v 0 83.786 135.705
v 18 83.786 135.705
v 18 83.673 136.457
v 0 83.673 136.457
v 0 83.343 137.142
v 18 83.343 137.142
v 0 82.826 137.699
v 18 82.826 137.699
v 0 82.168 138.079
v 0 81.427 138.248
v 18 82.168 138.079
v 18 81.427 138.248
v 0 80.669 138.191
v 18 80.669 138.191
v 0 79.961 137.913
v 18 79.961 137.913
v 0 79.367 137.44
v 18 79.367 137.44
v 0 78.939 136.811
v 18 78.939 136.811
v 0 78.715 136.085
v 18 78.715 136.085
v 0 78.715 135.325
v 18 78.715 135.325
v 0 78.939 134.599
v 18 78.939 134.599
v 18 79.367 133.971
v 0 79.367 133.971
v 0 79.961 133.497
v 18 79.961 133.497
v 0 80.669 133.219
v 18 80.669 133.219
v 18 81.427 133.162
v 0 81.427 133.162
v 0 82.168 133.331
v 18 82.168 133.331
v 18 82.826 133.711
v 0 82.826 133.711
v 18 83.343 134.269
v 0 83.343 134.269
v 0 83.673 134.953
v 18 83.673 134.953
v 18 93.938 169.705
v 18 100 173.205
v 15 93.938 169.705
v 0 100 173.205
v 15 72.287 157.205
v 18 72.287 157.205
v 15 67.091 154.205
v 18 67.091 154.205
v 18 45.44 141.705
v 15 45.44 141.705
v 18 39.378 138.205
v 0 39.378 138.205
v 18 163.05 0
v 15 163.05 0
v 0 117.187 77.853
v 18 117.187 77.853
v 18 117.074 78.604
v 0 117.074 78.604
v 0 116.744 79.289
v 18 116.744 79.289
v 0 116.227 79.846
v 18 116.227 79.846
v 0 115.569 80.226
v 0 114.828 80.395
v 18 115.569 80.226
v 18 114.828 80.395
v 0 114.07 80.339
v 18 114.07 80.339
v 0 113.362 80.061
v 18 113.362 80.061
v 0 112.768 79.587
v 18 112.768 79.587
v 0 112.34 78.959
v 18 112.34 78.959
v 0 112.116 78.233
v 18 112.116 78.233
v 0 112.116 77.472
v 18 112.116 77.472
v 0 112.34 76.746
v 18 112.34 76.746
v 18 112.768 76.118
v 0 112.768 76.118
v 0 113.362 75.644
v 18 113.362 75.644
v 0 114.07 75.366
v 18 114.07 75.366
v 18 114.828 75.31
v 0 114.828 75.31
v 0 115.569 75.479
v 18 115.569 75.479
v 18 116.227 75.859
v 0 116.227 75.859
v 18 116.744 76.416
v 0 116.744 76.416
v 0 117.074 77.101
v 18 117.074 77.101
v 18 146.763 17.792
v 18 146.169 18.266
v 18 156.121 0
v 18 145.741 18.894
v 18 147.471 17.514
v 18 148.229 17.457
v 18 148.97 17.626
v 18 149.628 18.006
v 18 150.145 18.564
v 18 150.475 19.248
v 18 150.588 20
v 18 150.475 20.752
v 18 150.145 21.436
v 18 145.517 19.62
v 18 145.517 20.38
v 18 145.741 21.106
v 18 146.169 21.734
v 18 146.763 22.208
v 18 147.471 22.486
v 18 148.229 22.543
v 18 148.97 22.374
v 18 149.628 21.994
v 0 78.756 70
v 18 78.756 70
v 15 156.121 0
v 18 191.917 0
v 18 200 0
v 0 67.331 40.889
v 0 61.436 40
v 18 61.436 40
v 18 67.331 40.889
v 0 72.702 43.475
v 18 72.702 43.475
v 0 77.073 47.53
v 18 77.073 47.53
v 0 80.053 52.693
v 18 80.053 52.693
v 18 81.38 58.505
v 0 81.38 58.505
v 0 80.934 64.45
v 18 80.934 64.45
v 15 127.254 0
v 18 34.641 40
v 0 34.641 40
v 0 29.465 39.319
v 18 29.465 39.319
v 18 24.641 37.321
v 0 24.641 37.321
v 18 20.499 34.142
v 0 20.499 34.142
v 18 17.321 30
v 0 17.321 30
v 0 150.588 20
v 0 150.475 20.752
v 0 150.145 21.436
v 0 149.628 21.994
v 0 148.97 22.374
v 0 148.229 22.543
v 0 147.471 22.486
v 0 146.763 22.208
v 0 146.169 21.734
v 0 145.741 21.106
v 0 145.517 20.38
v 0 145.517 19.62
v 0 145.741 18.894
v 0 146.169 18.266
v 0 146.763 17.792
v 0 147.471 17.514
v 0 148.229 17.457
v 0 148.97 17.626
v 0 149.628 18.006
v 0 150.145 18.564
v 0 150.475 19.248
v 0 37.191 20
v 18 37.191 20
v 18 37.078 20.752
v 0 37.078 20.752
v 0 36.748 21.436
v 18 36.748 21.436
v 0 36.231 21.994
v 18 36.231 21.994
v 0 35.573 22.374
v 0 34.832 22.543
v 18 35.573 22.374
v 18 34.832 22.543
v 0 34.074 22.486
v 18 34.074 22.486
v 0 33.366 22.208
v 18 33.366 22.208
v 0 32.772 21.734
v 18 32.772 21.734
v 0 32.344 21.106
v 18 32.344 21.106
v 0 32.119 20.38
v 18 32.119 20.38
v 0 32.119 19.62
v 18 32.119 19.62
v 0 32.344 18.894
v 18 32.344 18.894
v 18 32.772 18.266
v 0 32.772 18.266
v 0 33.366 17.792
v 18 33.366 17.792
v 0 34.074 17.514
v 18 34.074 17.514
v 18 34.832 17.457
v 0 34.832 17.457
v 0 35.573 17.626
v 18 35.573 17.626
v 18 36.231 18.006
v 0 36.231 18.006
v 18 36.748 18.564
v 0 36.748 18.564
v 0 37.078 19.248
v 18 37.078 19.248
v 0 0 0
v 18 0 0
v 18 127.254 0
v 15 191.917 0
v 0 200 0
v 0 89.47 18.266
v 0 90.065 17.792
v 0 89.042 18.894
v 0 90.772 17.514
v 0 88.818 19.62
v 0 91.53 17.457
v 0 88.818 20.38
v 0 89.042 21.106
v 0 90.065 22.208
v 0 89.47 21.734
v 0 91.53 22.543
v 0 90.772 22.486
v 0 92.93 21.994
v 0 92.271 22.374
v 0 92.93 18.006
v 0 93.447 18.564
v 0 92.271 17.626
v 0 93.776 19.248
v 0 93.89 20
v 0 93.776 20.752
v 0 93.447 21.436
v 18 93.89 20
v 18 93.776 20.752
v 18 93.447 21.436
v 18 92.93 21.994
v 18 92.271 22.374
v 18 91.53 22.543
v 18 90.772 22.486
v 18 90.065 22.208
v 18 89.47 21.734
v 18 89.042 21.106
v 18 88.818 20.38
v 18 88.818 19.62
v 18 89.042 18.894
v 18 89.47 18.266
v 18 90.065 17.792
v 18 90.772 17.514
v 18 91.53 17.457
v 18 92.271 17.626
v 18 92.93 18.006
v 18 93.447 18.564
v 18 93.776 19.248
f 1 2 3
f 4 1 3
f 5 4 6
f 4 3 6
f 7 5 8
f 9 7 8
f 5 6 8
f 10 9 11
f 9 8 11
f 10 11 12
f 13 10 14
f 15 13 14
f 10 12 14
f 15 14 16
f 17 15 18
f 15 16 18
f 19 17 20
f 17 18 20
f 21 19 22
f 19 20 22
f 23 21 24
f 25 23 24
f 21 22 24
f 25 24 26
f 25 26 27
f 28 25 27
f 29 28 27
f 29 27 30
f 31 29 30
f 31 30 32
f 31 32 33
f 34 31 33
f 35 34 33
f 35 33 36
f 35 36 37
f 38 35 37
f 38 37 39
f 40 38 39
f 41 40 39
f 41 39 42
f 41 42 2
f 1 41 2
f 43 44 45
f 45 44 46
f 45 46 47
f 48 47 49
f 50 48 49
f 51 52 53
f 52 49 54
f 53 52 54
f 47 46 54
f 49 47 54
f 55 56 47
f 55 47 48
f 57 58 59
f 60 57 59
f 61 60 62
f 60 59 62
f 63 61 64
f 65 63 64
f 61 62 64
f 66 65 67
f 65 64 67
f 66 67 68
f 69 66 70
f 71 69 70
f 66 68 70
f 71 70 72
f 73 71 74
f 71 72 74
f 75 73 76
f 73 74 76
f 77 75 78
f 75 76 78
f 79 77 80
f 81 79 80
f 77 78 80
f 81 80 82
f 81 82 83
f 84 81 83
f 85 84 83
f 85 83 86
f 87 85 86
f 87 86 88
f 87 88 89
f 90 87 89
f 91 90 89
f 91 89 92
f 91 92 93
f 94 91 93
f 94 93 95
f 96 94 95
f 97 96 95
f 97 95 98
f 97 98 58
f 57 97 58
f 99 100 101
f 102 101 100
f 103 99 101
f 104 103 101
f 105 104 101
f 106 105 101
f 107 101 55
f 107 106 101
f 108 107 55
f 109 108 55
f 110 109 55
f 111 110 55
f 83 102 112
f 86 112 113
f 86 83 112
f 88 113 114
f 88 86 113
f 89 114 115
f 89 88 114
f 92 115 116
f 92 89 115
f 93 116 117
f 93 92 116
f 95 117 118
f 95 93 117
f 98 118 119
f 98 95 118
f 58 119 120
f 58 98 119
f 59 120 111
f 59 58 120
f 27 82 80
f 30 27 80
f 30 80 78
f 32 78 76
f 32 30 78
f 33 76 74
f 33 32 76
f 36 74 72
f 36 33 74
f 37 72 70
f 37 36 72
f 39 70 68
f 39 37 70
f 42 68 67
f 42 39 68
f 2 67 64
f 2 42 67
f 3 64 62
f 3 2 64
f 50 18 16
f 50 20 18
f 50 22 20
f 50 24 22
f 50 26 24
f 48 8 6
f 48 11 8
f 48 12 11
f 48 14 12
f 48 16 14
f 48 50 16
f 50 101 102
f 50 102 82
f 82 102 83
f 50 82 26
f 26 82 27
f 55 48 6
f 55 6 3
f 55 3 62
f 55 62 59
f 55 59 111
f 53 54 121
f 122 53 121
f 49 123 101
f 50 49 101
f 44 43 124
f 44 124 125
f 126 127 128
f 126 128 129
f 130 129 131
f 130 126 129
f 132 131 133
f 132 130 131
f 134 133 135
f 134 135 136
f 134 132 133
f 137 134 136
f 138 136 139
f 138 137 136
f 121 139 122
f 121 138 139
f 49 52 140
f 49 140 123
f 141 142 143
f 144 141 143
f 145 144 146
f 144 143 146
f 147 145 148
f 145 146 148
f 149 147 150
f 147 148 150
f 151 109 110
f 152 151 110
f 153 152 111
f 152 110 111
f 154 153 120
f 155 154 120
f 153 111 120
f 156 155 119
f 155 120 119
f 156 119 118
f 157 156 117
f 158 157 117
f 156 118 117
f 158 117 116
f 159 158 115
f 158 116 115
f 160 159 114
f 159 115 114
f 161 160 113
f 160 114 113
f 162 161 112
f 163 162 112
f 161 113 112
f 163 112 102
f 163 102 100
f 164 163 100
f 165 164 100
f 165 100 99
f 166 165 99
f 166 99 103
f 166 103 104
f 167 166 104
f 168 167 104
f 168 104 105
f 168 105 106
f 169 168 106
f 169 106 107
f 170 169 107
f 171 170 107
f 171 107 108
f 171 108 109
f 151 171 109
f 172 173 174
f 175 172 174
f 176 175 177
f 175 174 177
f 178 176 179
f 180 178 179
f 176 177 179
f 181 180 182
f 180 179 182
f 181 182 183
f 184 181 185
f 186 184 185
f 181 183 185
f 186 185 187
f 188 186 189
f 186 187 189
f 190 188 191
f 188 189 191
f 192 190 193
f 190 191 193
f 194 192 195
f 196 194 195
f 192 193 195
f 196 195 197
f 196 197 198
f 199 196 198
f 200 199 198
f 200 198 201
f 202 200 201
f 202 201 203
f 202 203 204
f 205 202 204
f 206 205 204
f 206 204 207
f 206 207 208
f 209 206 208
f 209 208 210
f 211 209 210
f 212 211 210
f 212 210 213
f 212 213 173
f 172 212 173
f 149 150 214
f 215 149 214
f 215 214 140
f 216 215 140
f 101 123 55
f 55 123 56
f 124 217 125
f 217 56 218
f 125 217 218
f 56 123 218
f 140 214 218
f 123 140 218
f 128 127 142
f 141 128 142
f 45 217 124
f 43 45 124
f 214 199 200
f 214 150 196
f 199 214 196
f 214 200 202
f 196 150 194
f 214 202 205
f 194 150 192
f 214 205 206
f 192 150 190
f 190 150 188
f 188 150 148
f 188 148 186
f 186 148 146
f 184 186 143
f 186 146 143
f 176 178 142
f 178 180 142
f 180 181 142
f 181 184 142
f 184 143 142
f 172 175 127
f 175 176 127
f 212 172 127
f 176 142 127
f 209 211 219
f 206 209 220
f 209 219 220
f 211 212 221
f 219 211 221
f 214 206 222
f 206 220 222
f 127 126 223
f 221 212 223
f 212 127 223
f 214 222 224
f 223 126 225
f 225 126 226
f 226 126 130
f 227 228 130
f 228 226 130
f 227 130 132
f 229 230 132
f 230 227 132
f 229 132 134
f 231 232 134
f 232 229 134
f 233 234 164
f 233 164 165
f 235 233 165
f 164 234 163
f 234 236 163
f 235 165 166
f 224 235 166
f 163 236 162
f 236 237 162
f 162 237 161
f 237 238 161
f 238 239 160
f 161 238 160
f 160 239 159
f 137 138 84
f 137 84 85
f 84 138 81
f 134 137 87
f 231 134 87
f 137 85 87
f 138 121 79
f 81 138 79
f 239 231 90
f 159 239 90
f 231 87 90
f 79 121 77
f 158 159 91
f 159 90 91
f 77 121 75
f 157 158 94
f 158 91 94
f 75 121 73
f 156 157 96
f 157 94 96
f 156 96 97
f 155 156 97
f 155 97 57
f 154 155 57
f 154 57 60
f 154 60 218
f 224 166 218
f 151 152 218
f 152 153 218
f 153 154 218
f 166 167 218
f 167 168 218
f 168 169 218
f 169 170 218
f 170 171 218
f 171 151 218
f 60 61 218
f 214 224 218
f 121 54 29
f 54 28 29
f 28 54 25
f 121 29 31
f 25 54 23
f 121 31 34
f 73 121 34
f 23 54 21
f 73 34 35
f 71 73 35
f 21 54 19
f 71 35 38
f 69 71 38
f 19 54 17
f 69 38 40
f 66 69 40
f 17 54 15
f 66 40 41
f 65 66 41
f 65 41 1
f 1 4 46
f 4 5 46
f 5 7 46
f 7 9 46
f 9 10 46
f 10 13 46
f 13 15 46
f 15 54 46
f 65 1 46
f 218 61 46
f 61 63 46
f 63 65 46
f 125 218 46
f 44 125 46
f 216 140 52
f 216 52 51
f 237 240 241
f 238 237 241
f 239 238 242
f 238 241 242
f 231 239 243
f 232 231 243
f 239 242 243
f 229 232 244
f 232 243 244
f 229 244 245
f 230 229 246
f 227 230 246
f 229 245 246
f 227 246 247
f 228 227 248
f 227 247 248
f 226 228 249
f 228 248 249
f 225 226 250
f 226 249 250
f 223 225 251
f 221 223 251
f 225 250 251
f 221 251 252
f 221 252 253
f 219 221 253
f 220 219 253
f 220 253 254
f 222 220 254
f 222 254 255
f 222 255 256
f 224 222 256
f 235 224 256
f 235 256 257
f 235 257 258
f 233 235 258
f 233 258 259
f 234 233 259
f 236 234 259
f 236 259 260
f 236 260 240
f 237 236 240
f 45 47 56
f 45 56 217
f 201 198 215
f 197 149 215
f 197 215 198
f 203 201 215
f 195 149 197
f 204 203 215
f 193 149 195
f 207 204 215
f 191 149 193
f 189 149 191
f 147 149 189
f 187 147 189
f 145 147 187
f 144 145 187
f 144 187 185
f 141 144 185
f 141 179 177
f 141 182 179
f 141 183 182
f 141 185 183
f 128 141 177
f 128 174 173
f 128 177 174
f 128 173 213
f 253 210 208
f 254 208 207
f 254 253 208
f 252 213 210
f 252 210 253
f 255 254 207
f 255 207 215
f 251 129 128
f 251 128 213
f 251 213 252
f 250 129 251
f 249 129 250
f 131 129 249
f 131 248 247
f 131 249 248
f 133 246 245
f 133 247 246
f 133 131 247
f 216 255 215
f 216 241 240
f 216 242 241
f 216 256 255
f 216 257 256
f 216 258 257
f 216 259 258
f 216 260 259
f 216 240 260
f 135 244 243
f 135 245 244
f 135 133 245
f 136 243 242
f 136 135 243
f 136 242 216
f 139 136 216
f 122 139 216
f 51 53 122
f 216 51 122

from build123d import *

# Parameters (mm, degrees)
PAD_DEPTH       = 18
SKETCH001_R     = 2.55
POCKET_DEPTH    = 18.001
SKETCH002_W     = 3
SKETCH002_H     = 25
POCKET002_DEPTH = 200.001


with BuildPart() as part:
    # Sketch → Pad (new body)
    with BuildSketch(Plane.YZ):
        with BuildLine():
            Line((0, 0), (200, 0))
            Line((200, 0), (100, 173.205081))
            Line((100, 173.205081), (39.378222, 138.205081))
            Line((39.378222, 138.205081), (78.756443, 70))
            ThreePointArc((61.435935, 40), (78.756443, 50), (78.756443, 70))
            Line((61.435935, 40), (34.641016, 40))
            ThreePointArc((34.641016, 40), (24.641016, 37.320508), (17.320508, 30))
            Line((17.320508, 30), (0, 0))
        make_face()
    extrude(amount=PAD_DEPTH)

    # Sketch001 (on Face10 of Pad) → Pocket (cut, through all)
    with BuildSketch(Plane.YZ.offset(18)):
        with Locations((81.236116, 135.705081)):
            Circle(SKETCH001_R)
        with Locations((114.637296, 77.85254)):
            Circle(SKETCH001_R)
        with Locations((148.038476, 20)):
            Circle(SKETCH001_R)
        with Locations((91.339746, 20)):
            Circle(SKETCH001_R)
        with Locations((34.641016, 20)):
            Circle(SKETCH001_R)
    extrude(amount=-POCKET_DEPTH, mode=Mode.SUBTRACT)

    # Sketch002 (on Face8 of Clone001) → Pocket002 (cut, through all)
    with BuildSketch(Plane(origin=(0, -50, 86.60254), x_dir=(1, 0, 0), z_dir=(0, -0.5, 0.866025))):
        with Locations((16.5, 153.705081)):
            Rectangle(SKETCH002_W, SKETCH002_H)
        with Locations((16.5, 122.705081)):
            Rectangle(SKETCH002_W, SKETCH002_H)
    extrude(amount=-POCKET002_DEPTH, mode=Mode.SUBTRACT)


solid = part.part
